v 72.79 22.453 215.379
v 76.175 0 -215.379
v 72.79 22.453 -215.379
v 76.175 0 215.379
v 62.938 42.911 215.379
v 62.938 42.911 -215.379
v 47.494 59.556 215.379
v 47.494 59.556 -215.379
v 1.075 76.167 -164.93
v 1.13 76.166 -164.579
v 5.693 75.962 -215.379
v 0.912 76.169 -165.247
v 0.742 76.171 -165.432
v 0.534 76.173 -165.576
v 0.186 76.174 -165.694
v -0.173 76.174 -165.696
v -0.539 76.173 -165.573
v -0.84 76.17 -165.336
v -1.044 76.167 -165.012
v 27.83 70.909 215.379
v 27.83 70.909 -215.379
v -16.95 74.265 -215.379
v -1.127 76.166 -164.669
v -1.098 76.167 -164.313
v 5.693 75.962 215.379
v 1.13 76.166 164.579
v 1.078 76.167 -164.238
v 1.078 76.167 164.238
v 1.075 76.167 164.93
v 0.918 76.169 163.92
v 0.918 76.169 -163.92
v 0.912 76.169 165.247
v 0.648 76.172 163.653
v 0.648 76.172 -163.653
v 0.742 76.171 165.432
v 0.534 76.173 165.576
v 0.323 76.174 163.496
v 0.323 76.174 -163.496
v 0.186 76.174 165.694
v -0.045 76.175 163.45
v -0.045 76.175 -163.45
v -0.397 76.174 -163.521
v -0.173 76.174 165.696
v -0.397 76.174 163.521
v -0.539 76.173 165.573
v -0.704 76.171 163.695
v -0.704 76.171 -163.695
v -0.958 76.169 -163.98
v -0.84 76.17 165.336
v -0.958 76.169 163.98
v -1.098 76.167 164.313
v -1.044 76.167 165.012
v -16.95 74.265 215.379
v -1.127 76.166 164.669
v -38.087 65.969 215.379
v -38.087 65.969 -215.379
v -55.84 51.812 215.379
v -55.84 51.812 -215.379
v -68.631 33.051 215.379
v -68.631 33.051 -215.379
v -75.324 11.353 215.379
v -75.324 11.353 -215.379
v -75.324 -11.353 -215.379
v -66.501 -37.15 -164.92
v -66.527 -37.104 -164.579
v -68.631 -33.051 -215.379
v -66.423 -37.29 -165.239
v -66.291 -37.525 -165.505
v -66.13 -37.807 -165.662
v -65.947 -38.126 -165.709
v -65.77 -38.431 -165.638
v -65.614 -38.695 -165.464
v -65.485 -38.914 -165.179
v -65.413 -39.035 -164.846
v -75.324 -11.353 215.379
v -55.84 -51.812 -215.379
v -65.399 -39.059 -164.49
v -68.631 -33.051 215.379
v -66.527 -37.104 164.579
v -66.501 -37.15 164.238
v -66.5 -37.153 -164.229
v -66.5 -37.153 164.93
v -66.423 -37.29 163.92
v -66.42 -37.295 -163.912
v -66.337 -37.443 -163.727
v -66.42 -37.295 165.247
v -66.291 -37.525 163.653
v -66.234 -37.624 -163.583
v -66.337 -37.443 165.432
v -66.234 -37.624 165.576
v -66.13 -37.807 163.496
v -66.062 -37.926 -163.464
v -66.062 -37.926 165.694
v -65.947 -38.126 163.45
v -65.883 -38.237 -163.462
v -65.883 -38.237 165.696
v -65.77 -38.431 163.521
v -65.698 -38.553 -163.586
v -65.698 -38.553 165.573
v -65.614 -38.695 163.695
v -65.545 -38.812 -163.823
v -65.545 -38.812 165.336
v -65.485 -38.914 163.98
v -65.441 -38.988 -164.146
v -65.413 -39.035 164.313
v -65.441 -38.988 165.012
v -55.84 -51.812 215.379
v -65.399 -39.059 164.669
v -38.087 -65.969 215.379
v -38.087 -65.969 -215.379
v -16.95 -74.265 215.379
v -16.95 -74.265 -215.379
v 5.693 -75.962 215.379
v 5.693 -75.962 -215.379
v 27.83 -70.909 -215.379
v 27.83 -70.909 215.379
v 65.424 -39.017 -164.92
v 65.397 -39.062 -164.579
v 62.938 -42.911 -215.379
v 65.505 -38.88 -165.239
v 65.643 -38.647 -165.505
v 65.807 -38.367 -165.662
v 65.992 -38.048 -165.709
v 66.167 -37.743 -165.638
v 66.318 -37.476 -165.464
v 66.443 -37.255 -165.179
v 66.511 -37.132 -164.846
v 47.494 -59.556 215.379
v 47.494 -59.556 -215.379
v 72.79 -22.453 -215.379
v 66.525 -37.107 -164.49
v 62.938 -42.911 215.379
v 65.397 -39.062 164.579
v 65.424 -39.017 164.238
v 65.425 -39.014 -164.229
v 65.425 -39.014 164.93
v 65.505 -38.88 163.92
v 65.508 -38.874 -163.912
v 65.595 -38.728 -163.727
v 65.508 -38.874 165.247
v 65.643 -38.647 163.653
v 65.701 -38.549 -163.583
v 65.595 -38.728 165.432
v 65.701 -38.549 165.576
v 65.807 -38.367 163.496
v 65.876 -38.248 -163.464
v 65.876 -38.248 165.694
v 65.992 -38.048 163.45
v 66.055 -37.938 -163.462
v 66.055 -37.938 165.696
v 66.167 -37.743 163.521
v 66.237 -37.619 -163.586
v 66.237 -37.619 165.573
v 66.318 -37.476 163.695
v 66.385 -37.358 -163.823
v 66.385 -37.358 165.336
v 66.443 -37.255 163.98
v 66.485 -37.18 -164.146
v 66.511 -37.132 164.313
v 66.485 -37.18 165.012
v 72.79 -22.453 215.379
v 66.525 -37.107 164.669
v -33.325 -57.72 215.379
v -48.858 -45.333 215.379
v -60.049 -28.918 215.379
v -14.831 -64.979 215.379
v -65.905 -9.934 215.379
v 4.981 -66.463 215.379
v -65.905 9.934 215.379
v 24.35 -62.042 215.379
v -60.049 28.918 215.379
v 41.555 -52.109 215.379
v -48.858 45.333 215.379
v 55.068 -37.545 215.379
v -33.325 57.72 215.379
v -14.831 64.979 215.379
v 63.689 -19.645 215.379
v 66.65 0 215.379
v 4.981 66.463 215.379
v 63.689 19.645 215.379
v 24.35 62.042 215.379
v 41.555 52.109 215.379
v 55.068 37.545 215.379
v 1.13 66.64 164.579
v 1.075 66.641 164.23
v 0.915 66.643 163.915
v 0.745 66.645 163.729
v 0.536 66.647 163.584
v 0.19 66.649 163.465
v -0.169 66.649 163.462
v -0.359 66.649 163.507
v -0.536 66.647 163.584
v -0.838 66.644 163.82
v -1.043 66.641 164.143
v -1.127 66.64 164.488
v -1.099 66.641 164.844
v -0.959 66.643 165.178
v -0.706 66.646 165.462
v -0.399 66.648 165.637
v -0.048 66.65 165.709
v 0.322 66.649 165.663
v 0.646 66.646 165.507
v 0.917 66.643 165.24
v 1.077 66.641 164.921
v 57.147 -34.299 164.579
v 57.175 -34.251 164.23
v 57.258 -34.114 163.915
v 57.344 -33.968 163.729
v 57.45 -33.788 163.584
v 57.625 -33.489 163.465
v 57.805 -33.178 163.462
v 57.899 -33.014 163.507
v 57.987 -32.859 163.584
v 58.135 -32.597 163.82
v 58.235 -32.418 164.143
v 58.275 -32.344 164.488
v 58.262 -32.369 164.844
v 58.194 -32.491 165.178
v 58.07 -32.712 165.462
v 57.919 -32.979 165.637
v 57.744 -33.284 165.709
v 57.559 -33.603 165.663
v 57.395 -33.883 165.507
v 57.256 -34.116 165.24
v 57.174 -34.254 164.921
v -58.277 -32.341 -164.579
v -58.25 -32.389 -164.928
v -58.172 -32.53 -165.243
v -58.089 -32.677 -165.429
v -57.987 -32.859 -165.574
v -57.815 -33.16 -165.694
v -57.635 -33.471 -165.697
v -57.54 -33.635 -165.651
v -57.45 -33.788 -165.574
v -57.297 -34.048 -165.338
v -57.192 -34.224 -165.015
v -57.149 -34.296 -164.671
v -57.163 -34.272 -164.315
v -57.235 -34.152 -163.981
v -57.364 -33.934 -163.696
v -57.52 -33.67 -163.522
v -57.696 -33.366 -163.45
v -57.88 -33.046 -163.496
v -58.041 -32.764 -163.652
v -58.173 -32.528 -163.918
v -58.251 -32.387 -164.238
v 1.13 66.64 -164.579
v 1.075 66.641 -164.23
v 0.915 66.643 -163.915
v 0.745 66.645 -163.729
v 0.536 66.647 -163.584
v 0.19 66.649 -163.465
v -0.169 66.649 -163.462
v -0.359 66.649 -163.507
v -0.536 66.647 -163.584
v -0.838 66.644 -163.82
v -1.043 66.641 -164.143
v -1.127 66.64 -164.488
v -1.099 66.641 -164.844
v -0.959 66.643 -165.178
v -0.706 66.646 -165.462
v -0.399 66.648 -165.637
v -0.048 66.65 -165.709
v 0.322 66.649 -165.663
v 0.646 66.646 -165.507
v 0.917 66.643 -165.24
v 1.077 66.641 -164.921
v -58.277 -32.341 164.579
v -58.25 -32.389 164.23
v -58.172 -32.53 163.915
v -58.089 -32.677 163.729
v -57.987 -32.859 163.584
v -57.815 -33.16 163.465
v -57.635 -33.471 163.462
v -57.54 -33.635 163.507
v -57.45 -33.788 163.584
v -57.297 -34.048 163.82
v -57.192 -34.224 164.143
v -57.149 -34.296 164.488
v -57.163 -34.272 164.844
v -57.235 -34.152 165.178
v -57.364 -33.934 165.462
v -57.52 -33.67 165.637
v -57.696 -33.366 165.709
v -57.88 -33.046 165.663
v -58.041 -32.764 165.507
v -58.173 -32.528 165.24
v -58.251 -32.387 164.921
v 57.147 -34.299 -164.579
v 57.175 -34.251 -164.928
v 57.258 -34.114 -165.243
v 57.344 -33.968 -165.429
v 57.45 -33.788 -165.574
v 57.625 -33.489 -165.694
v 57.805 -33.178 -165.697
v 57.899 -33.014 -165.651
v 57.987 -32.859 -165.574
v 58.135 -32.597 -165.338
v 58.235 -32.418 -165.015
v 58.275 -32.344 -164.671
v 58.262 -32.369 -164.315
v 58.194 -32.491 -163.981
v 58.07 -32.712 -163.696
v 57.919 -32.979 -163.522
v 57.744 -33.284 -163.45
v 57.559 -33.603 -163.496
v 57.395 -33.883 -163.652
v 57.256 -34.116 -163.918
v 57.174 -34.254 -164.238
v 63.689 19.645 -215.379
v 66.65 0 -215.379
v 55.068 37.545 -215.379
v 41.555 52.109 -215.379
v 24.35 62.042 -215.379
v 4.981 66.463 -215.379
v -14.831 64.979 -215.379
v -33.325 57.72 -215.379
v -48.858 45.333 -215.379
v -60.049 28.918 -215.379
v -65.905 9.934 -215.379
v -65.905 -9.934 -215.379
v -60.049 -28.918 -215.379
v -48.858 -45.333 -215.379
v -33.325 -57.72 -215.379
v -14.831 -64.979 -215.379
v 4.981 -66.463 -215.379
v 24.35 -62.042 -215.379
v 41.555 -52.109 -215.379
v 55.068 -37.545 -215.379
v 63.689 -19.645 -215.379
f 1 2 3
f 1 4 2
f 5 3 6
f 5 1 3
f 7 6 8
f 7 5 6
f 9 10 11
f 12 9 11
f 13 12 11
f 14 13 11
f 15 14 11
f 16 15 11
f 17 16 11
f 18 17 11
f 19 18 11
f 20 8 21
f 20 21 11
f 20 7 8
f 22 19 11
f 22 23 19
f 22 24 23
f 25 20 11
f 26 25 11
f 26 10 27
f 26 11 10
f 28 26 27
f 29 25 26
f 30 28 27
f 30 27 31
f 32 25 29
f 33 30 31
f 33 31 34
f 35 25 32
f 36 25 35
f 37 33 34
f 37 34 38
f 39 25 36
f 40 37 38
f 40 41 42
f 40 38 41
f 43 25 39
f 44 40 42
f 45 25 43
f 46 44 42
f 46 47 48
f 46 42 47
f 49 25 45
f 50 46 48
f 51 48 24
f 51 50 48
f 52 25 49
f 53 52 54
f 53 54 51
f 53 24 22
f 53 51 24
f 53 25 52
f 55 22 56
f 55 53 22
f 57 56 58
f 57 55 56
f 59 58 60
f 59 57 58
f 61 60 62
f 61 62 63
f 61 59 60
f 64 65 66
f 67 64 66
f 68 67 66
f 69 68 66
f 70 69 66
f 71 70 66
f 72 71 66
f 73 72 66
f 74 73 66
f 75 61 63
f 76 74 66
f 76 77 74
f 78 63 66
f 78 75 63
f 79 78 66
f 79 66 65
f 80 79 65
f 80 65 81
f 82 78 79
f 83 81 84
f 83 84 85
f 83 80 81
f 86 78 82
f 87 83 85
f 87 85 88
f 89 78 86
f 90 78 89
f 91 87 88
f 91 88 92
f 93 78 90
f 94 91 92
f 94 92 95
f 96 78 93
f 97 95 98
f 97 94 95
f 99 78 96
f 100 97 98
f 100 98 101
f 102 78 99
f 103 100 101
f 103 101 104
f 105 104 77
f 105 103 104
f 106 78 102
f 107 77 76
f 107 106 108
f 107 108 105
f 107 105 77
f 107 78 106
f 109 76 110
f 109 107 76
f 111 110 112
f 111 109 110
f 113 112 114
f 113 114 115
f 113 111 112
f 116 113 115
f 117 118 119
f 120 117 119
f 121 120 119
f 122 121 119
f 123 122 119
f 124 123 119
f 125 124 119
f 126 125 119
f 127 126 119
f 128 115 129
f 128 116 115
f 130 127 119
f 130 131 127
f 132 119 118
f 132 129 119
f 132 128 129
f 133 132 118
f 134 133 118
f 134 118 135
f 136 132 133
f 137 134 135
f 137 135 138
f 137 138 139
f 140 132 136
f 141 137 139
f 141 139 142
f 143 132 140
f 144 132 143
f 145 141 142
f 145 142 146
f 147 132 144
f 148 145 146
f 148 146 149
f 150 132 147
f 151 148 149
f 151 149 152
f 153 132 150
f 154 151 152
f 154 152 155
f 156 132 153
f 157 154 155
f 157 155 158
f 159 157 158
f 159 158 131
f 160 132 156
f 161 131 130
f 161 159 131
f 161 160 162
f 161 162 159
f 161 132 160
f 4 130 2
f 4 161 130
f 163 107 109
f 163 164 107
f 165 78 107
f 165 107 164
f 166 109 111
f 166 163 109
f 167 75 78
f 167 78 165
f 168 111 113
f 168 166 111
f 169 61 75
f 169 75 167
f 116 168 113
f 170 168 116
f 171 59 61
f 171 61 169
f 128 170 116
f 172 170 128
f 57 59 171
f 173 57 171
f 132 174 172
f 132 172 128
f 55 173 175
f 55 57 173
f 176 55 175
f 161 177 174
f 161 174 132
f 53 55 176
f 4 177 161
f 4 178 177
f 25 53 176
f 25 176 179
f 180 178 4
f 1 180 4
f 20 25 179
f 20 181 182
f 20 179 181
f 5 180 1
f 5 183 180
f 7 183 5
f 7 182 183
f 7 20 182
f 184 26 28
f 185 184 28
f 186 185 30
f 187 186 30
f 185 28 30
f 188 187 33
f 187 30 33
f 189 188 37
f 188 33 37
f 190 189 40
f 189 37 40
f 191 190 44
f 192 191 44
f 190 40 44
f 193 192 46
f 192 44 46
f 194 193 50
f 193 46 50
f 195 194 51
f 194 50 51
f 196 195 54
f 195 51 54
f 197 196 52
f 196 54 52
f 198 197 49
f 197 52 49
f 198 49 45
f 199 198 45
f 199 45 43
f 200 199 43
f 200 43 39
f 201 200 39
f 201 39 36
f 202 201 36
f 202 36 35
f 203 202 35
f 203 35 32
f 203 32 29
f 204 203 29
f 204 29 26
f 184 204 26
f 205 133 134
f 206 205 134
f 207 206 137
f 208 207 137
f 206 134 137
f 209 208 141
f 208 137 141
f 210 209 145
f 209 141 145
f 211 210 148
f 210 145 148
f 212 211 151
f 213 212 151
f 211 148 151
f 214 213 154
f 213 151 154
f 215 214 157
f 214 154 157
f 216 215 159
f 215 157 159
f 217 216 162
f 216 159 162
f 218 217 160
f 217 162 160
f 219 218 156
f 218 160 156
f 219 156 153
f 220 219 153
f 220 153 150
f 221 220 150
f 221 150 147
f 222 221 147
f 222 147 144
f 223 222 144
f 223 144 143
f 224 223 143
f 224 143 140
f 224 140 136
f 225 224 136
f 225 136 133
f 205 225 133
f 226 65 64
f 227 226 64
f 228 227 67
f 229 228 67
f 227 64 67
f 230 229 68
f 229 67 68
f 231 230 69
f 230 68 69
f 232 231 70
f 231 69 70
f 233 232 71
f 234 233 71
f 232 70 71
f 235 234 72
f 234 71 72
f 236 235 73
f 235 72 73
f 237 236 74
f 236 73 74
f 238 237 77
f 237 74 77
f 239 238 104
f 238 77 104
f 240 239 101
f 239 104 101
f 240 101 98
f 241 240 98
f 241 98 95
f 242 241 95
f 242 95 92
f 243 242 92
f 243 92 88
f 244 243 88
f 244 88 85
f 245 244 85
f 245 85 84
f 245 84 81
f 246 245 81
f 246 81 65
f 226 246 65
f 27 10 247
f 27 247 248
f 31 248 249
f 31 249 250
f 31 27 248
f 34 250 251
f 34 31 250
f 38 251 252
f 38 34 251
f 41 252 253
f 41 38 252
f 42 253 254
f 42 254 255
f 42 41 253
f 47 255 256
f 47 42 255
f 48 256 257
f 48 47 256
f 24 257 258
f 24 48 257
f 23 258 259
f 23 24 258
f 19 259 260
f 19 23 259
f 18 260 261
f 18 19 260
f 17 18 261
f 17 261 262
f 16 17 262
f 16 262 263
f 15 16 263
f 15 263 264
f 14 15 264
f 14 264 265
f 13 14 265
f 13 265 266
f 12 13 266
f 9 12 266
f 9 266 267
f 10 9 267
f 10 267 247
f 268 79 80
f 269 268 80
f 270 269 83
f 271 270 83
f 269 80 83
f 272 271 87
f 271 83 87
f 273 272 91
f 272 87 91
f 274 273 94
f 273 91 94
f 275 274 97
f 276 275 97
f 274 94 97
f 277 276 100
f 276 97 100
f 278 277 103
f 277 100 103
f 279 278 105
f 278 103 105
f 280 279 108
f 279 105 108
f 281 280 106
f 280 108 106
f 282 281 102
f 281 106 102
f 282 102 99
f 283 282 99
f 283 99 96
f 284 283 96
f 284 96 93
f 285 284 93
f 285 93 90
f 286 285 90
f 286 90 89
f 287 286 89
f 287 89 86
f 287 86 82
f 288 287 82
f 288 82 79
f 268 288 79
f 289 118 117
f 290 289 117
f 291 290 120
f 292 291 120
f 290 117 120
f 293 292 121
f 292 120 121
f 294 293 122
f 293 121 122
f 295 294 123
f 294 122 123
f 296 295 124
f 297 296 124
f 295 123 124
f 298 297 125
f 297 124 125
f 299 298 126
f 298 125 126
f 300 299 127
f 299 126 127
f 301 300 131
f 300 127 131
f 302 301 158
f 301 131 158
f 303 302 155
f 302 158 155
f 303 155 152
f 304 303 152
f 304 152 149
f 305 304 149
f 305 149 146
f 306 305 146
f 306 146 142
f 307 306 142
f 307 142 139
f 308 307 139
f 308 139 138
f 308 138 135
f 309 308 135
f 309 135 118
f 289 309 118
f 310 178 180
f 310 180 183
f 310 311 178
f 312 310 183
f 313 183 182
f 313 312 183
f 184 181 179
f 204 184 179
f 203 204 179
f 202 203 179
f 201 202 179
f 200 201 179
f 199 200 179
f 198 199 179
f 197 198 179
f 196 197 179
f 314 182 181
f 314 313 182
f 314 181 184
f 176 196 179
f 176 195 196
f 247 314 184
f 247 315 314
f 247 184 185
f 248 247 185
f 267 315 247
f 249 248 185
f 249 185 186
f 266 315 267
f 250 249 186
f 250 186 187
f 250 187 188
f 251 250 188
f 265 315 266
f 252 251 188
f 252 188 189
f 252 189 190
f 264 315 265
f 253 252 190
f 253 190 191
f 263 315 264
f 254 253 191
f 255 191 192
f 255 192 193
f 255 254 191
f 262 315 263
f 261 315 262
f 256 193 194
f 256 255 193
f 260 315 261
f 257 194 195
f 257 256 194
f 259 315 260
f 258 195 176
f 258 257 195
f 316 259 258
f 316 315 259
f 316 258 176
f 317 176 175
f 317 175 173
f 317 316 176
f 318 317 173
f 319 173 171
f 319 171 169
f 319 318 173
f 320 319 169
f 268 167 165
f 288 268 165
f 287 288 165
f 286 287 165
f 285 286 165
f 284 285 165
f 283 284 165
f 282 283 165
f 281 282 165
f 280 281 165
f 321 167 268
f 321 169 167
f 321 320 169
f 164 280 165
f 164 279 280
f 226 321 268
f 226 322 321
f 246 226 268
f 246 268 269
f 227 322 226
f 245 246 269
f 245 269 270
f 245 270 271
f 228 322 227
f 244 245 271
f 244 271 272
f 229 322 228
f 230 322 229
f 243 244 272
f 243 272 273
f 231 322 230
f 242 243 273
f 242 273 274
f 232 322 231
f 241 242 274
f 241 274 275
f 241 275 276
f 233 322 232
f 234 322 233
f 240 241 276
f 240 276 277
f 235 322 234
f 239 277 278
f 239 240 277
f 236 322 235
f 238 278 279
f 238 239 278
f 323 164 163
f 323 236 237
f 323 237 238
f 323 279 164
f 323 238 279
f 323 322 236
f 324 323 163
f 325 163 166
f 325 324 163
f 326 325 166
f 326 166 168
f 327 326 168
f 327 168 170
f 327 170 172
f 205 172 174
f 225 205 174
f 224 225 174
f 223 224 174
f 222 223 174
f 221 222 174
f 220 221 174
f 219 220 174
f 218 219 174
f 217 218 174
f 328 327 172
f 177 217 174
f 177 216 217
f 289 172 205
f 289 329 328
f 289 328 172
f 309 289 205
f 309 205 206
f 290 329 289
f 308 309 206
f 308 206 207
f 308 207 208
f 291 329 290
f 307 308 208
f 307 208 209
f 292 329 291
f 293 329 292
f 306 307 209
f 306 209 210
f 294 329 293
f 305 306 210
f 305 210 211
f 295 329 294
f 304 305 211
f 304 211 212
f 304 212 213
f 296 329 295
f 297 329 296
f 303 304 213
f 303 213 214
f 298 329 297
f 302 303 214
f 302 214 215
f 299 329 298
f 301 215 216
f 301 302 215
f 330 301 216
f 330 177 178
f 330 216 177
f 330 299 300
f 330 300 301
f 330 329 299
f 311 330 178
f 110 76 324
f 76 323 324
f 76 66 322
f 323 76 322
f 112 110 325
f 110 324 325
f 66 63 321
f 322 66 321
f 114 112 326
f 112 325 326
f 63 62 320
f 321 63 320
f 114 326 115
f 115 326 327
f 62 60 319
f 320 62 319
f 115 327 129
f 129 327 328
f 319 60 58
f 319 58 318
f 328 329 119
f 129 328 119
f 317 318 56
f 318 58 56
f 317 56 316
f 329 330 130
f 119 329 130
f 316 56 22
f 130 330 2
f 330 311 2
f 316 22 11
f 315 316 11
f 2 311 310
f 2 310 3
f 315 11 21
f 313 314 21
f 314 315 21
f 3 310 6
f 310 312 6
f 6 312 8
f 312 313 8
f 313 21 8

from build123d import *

# Parameters (mm, degrees)
SKETCH1_R                  = 76.1746
SKETCH1_R_2                = 66.6496
BOSS_EXTRUDE1_DEPTH        = 215.3793
F_4_40_TAPPED_HOLE1_REACH  = 418.391
F_4_40_TAPPED_HOLE1_BORE_R = 1.1303
CIRPATTERN1_COUNT          = 3
MIRROR1_COPY_1_REACH       = 418.391
MIRROR1_COPY_1_SKETCH_R    = 1.1303
MIRROR1_COPY_2_REACH       = 418.391
MIRROR1_COPY_2_SKETCH_R    = 1.1303


with BuildPart() as part:
    # Sketch1 → Boss-Extrude1 (new, symmetric)
    with BuildSketch(Plane.XY):
        Circle(SKETCH1_R)
        Circle(SKETCH1_R_2, mode=Mode.SUBTRACT)
    extrude(amount=BOSS_EXTRUDE1_DEPTH, both=True)

    # #4-40 Tapped Hole1 bore (on position points) → #4-40 Tapped Hole1 (cut, up to next)
    with BuildSketch(Plane(origin=(0, 76.1746, 164.5793), x_dir=(1, 0, 0), z_dir=(0, 1, 0)), mode=Mode.PRIVATE) as f_4_40_tapped_hole1_sk1:
        Circle(F_4_40_TAPPED_HOLE1_BORE_R)
    f_4_40_tapped_hole1_tool1 = extrude(f_4_40_tapped_hole1_sk1.sketch, amount=-F_4_40_TAPPED_HOLE1_REACH, mode=Mode.PRIVATE) & part.part
    f_4_40_tapped_hole1 = f_4_40_tapped_hole1_tool1.solids().sort_by_distance((0, 76.1746, 164.5793))[0]
    add(f_4_40_tapped_hole1, mode=Mode.SUBTRACT)

    # CirPattern1: #4-40 Tapped Hole1 ×3 about axis
    cirpattern1_axis = Axis((0, 0, 215.3793), (0, 0, 1))
    for i in range(1, CIRPATTERN1_COUNT):
        add(f_4_40_tapped_hole1.rotate(cirpattern1_axis, i * 360 / CIRPATTERN1_COUNT), mode=Mode.SUBTRACT)

    # Mirror1: #4-40 Tapped Hole1 across plane
    add(f_4_40_tapped_hole1.mirror(Plane.XY), mode=Mode.SUBTRACT)

    # Mirror1 copy 1 sketch → Mirror1 copy 1 (cut, up to next)
    with BuildSketch(Plane(origin=(-65.969138723, -38.0873, -164.5793), x_dir=(-0.4999999999999998, 0.8660254037844387, 0), z_dir=(-0.8660254037844387, -0.4999999999999998, 0)), mode=Mode.PRIVATE) as mirror1_copy_1_sk1:
        Circle(MIRROR1_COPY_1_SKETCH_R)
    mirror1_copy_1_tool1 = extrude(mirror1_copy_1_sk1.sketch, amount=-MIRROR1_COPY_1_REACH, mode=Mode.PRIVATE) & part.part
    add(mirror1_copy_1_tool1.solids().sort_by_distance((-65.969138723, -38.0873, -164.5793))[0], mode=Mode.SUBTRACT)

    # Mirror1 copy 2 sketch → Mirror1 copy 2 (cut, up to next)
    with BuildSketch(Plane(origin=(65.969138723, -38.0873, -164.5793), x_dir=(-0.5000000000000004, -0.8660254037844384, 0), z_dir=(0.8660254037844384, -0.5000000000000004, 0)), mode=Mode.PRIVATE) as mirror1_copy_2_sk1:
        Circle(MIRROR1_COPY_2_SKETCH_R)
    mirror1_copy_2_tool1 = extrude(mirror1_copy_2_sk1.sketch, amount=-MIRROR1_COPY_2_REACH, mode=Mode.PRIVATE) & part.part
    add(mirror1_copy_2_tool1.solids().sort_by_distance((65.969138723, -38.0873, -164.5793))[0], mode=Mode.SUBTRACT)


solid = part.part
